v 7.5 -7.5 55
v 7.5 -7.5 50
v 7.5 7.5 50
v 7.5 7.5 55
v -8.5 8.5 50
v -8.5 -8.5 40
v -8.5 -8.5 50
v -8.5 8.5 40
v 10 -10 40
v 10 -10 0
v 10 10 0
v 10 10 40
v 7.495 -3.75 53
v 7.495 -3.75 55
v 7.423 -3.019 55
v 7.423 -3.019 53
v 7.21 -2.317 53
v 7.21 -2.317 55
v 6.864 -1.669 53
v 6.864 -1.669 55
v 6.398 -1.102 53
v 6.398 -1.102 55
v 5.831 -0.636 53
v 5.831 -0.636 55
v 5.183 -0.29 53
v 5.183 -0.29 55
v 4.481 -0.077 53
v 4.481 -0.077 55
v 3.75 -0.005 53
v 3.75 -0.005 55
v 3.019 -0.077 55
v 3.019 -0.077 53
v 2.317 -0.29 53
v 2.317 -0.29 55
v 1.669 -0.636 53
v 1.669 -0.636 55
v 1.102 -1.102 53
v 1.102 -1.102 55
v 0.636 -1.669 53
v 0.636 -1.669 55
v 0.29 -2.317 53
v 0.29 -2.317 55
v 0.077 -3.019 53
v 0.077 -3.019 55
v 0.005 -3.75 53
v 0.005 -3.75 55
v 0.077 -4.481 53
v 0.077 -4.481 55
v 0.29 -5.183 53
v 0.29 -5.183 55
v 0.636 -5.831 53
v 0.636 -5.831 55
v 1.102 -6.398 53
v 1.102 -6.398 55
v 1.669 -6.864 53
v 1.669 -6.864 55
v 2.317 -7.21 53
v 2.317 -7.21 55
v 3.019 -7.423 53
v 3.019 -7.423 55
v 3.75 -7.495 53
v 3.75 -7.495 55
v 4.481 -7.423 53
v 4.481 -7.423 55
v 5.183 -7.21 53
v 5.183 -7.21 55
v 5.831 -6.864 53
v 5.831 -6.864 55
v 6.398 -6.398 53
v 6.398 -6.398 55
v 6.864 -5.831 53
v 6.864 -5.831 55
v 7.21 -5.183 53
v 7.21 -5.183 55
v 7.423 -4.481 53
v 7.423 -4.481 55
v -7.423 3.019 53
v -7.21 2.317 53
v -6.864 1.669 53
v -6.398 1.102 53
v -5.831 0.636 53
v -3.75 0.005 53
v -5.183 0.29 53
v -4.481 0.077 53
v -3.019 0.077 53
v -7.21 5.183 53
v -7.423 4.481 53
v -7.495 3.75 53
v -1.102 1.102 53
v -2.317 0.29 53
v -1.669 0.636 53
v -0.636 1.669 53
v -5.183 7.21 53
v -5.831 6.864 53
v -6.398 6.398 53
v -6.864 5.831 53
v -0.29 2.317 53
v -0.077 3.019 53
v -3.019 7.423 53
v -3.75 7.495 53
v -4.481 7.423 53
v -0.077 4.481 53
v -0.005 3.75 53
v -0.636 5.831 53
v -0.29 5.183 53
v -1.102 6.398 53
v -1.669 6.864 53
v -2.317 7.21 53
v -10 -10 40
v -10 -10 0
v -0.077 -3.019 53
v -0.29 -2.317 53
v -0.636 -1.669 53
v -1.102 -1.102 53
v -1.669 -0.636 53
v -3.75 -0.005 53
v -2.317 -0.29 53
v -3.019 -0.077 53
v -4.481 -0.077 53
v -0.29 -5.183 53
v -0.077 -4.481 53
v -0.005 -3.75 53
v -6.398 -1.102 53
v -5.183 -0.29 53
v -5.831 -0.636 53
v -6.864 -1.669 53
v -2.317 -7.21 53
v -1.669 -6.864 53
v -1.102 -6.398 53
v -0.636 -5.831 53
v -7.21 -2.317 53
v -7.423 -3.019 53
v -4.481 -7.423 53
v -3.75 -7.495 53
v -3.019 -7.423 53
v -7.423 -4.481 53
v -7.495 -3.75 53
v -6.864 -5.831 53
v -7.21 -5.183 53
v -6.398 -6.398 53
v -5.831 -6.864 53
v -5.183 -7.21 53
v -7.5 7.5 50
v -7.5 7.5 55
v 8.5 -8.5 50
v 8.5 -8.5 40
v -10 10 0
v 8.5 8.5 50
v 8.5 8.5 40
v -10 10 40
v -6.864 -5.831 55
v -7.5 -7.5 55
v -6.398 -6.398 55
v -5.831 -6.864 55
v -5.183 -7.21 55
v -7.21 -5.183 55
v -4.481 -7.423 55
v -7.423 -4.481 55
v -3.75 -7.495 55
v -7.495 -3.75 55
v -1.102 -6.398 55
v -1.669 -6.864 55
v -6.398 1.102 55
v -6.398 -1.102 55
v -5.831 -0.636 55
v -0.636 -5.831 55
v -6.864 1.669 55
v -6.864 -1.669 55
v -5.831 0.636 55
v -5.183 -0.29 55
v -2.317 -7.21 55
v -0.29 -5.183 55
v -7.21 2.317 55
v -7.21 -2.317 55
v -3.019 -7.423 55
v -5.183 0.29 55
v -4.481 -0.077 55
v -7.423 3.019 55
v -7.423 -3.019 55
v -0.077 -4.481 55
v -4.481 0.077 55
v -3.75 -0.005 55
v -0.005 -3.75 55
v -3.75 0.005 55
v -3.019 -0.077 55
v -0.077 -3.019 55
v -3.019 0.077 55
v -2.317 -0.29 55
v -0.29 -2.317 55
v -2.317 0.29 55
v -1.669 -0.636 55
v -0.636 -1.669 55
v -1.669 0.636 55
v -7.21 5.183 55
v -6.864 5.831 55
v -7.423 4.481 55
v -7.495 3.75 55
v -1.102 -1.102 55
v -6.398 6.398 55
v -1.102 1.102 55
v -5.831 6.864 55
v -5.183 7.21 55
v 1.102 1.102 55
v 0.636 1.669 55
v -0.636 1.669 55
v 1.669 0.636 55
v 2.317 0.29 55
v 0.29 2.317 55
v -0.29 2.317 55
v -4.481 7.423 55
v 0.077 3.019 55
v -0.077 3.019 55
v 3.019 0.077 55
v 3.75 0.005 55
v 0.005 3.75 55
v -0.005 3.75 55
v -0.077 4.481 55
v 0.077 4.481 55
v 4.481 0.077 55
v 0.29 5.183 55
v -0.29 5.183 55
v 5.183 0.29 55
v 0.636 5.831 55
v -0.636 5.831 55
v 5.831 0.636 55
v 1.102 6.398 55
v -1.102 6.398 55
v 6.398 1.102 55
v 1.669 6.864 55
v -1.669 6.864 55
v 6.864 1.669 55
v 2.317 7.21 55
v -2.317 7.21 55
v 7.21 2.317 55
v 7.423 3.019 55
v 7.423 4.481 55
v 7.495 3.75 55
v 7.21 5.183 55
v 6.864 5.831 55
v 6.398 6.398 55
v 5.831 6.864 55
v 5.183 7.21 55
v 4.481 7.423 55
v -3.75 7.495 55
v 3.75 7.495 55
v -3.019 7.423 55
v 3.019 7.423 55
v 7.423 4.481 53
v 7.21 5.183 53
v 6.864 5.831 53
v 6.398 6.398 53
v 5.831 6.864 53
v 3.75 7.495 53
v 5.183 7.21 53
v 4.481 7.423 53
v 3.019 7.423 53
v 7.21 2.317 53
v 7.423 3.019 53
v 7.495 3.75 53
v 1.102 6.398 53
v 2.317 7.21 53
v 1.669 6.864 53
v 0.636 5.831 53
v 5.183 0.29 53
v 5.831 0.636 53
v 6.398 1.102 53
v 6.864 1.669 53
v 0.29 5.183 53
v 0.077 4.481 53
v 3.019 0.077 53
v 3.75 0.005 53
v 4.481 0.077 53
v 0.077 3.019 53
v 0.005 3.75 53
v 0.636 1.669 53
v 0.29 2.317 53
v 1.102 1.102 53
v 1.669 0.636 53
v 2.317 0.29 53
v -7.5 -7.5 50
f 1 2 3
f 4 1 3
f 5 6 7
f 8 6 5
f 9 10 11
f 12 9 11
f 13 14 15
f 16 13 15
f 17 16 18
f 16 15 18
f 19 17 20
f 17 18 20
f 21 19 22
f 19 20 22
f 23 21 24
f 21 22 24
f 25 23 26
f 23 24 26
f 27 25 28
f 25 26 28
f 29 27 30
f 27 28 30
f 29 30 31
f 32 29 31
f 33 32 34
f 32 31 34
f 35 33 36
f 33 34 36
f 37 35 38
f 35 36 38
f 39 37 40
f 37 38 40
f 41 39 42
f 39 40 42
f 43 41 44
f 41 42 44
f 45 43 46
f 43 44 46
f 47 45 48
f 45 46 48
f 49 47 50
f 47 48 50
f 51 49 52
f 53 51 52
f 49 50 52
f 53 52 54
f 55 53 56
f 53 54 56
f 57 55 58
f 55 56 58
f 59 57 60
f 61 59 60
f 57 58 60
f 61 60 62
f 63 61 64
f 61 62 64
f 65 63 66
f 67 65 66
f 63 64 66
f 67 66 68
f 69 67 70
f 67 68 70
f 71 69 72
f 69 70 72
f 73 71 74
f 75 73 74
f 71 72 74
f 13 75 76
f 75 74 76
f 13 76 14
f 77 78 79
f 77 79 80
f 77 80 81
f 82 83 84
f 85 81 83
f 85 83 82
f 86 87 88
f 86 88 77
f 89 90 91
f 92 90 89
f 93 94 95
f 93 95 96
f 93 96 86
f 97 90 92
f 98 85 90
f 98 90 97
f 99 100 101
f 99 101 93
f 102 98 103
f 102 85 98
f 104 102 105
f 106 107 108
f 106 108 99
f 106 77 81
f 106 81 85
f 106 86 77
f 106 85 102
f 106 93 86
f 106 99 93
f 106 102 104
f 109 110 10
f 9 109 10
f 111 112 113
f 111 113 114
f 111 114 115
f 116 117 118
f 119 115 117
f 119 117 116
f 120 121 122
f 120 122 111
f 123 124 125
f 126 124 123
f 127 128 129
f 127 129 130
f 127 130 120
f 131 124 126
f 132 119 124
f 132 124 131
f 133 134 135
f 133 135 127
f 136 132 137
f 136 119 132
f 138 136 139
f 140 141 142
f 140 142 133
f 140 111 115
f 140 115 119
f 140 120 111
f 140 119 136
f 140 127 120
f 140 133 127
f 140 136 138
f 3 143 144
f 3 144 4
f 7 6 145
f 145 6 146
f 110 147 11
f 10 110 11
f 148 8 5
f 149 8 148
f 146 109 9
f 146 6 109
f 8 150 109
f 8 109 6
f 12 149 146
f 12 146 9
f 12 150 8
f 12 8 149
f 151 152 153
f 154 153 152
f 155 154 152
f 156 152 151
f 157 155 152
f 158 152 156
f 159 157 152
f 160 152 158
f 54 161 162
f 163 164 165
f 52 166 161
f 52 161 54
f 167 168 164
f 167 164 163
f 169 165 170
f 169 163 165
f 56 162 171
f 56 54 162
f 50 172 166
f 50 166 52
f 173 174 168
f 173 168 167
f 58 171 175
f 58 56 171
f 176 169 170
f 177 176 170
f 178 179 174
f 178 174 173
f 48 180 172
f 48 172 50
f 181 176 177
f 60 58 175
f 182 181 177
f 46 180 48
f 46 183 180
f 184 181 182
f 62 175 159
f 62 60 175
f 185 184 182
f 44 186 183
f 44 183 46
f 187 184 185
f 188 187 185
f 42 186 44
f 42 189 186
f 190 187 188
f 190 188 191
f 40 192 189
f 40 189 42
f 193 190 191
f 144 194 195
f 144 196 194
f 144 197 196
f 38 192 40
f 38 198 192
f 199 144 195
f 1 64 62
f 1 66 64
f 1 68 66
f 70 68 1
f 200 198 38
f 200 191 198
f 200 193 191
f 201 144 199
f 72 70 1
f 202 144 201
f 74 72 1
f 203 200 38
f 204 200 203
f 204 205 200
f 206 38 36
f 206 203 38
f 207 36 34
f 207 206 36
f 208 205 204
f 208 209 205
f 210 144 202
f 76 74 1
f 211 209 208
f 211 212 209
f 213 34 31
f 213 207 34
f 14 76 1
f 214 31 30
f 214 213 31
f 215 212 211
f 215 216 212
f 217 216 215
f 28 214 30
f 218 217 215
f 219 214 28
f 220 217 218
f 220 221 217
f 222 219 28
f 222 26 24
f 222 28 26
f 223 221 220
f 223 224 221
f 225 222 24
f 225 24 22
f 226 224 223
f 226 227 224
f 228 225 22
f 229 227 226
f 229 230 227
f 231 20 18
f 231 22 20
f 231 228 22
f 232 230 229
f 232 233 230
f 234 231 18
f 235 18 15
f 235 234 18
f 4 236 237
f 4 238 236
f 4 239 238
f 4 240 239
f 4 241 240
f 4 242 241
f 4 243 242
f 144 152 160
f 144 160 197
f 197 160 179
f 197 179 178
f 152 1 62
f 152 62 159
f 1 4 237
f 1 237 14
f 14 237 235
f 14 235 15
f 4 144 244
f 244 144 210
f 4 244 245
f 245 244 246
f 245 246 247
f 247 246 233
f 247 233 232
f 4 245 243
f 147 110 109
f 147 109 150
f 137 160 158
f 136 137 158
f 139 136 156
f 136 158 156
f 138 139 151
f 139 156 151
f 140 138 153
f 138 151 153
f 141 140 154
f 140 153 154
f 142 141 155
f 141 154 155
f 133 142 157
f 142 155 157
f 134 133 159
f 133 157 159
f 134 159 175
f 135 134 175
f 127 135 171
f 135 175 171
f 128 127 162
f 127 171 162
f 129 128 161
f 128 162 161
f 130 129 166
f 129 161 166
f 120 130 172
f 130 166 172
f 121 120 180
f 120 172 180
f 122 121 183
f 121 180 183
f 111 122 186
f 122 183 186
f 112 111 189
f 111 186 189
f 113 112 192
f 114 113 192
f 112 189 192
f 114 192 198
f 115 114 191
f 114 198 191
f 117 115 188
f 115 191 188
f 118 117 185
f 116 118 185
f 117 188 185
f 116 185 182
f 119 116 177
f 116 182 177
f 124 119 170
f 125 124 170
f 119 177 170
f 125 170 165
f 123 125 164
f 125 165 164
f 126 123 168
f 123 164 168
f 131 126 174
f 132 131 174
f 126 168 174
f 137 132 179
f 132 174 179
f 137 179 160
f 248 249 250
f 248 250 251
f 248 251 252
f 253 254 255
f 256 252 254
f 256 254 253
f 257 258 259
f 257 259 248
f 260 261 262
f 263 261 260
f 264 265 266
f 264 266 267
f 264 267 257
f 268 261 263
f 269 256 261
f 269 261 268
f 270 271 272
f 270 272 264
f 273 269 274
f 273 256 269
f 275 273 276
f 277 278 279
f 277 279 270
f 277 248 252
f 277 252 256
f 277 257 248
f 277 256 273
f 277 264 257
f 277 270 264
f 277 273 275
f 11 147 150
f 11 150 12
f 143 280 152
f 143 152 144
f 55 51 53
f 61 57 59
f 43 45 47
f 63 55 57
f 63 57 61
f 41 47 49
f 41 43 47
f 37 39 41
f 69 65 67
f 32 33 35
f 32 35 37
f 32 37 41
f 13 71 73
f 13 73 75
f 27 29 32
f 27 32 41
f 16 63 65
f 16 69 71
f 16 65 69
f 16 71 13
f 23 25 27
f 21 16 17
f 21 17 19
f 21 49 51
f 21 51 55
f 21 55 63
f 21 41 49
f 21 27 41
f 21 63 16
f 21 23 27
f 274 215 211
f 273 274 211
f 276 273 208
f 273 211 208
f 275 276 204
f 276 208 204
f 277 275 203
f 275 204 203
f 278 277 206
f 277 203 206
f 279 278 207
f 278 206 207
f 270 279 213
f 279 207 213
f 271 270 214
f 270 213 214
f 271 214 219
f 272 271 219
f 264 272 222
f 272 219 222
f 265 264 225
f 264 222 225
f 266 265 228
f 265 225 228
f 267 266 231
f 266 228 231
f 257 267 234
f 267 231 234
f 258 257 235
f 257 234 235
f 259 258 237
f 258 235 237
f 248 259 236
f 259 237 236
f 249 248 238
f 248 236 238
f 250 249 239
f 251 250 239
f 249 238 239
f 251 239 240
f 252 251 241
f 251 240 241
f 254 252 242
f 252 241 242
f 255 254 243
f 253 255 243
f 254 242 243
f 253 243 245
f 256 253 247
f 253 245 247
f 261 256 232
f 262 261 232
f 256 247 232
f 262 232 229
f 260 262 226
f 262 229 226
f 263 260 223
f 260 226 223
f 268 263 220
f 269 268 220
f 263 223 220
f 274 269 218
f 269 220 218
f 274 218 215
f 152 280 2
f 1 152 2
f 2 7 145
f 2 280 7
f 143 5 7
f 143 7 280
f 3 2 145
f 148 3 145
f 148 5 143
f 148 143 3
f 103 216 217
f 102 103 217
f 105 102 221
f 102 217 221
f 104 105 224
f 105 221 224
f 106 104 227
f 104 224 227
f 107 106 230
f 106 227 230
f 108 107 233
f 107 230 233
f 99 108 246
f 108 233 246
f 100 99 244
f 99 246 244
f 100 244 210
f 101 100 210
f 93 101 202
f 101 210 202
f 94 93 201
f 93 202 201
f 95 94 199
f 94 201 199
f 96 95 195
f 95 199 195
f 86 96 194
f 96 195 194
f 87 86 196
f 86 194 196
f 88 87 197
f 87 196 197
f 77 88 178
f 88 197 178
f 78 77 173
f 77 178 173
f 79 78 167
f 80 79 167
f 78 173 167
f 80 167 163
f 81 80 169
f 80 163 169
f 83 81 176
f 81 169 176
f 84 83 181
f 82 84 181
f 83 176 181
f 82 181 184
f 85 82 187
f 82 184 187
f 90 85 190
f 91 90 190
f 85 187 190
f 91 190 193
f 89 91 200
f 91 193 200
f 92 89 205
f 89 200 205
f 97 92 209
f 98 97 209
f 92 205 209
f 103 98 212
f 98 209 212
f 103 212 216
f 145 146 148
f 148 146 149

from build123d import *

# Parameters (mm, degrees)
SKETCH_1_W          = 20
SKETCH_1_H          = 20
EXTRUDE_1_DEPTH     = 40
SKETCH_2_W          = 17
SKETCH_2_H          = 17
EXTRUDE_2_DEPTH     = 10
SKETCH_3_W          = 15
SKETCH_3_H          = 15
EXTRUDE_3_DEPTH     = 5
SKETCH_4_R          = 3.745
CUT_EXTRUDE_1_DEPTH = 2


with BuildPart() as part:
    # ｽｹｯﾁ1 → ﾎﾞｽ - 押し出し1 (new body)
    with BuildSketch(Plane.XY):
        Rectangle(SKETCH_1_W, SKETCH_1_H)
    extrude(amount=EXTRUDE_1_DEPTH)

    # ｽｹｯﾁ2 → ﾎﾞｽ - 押し出し2 (add)
    with BuildSketch(Plane.XY.offset(40)):
        Rectangle(SKETCH_2_W, SKETCH_2_H)
    extrude(amount=EXTRUDE_2_DEPTH)

    # ｽｹｯﾁ3 → ﾎﾞｽ - 押し出し3 (add)
    with BuildSketch(Plane.XY.offset(50)):
        Rectangle(SKETCH_3_W, SKETCH_3_H)
    extrude(amount=EXTRUDE_3_DEPTH)

    # ｽｹｯﾁ4 → ｶｯﾄ - 押し出し1 (cut)
    with BuildSketch(Plane.XY.offset(55)):
        with Locations((-3.75, 3.75)):
            Circle(SKETCH_4_R)
        with Locations(Location((3.75, 3.75, 0), (0, 0, 180))):
            Circle(SKETCH_4_R)
        with Locations((3.75, -3.75)):
            Circle(SKETCH_4_R)
        with Locations(Location((-3.75, -3.75, 0), (0, 0, 180))):
            Circle(SKETCH_4_R)
    extrude(amount=-CUT_EXTRUDE_1_DEPTH, mode=Mode.SUBTRACT)


solid = part.part
